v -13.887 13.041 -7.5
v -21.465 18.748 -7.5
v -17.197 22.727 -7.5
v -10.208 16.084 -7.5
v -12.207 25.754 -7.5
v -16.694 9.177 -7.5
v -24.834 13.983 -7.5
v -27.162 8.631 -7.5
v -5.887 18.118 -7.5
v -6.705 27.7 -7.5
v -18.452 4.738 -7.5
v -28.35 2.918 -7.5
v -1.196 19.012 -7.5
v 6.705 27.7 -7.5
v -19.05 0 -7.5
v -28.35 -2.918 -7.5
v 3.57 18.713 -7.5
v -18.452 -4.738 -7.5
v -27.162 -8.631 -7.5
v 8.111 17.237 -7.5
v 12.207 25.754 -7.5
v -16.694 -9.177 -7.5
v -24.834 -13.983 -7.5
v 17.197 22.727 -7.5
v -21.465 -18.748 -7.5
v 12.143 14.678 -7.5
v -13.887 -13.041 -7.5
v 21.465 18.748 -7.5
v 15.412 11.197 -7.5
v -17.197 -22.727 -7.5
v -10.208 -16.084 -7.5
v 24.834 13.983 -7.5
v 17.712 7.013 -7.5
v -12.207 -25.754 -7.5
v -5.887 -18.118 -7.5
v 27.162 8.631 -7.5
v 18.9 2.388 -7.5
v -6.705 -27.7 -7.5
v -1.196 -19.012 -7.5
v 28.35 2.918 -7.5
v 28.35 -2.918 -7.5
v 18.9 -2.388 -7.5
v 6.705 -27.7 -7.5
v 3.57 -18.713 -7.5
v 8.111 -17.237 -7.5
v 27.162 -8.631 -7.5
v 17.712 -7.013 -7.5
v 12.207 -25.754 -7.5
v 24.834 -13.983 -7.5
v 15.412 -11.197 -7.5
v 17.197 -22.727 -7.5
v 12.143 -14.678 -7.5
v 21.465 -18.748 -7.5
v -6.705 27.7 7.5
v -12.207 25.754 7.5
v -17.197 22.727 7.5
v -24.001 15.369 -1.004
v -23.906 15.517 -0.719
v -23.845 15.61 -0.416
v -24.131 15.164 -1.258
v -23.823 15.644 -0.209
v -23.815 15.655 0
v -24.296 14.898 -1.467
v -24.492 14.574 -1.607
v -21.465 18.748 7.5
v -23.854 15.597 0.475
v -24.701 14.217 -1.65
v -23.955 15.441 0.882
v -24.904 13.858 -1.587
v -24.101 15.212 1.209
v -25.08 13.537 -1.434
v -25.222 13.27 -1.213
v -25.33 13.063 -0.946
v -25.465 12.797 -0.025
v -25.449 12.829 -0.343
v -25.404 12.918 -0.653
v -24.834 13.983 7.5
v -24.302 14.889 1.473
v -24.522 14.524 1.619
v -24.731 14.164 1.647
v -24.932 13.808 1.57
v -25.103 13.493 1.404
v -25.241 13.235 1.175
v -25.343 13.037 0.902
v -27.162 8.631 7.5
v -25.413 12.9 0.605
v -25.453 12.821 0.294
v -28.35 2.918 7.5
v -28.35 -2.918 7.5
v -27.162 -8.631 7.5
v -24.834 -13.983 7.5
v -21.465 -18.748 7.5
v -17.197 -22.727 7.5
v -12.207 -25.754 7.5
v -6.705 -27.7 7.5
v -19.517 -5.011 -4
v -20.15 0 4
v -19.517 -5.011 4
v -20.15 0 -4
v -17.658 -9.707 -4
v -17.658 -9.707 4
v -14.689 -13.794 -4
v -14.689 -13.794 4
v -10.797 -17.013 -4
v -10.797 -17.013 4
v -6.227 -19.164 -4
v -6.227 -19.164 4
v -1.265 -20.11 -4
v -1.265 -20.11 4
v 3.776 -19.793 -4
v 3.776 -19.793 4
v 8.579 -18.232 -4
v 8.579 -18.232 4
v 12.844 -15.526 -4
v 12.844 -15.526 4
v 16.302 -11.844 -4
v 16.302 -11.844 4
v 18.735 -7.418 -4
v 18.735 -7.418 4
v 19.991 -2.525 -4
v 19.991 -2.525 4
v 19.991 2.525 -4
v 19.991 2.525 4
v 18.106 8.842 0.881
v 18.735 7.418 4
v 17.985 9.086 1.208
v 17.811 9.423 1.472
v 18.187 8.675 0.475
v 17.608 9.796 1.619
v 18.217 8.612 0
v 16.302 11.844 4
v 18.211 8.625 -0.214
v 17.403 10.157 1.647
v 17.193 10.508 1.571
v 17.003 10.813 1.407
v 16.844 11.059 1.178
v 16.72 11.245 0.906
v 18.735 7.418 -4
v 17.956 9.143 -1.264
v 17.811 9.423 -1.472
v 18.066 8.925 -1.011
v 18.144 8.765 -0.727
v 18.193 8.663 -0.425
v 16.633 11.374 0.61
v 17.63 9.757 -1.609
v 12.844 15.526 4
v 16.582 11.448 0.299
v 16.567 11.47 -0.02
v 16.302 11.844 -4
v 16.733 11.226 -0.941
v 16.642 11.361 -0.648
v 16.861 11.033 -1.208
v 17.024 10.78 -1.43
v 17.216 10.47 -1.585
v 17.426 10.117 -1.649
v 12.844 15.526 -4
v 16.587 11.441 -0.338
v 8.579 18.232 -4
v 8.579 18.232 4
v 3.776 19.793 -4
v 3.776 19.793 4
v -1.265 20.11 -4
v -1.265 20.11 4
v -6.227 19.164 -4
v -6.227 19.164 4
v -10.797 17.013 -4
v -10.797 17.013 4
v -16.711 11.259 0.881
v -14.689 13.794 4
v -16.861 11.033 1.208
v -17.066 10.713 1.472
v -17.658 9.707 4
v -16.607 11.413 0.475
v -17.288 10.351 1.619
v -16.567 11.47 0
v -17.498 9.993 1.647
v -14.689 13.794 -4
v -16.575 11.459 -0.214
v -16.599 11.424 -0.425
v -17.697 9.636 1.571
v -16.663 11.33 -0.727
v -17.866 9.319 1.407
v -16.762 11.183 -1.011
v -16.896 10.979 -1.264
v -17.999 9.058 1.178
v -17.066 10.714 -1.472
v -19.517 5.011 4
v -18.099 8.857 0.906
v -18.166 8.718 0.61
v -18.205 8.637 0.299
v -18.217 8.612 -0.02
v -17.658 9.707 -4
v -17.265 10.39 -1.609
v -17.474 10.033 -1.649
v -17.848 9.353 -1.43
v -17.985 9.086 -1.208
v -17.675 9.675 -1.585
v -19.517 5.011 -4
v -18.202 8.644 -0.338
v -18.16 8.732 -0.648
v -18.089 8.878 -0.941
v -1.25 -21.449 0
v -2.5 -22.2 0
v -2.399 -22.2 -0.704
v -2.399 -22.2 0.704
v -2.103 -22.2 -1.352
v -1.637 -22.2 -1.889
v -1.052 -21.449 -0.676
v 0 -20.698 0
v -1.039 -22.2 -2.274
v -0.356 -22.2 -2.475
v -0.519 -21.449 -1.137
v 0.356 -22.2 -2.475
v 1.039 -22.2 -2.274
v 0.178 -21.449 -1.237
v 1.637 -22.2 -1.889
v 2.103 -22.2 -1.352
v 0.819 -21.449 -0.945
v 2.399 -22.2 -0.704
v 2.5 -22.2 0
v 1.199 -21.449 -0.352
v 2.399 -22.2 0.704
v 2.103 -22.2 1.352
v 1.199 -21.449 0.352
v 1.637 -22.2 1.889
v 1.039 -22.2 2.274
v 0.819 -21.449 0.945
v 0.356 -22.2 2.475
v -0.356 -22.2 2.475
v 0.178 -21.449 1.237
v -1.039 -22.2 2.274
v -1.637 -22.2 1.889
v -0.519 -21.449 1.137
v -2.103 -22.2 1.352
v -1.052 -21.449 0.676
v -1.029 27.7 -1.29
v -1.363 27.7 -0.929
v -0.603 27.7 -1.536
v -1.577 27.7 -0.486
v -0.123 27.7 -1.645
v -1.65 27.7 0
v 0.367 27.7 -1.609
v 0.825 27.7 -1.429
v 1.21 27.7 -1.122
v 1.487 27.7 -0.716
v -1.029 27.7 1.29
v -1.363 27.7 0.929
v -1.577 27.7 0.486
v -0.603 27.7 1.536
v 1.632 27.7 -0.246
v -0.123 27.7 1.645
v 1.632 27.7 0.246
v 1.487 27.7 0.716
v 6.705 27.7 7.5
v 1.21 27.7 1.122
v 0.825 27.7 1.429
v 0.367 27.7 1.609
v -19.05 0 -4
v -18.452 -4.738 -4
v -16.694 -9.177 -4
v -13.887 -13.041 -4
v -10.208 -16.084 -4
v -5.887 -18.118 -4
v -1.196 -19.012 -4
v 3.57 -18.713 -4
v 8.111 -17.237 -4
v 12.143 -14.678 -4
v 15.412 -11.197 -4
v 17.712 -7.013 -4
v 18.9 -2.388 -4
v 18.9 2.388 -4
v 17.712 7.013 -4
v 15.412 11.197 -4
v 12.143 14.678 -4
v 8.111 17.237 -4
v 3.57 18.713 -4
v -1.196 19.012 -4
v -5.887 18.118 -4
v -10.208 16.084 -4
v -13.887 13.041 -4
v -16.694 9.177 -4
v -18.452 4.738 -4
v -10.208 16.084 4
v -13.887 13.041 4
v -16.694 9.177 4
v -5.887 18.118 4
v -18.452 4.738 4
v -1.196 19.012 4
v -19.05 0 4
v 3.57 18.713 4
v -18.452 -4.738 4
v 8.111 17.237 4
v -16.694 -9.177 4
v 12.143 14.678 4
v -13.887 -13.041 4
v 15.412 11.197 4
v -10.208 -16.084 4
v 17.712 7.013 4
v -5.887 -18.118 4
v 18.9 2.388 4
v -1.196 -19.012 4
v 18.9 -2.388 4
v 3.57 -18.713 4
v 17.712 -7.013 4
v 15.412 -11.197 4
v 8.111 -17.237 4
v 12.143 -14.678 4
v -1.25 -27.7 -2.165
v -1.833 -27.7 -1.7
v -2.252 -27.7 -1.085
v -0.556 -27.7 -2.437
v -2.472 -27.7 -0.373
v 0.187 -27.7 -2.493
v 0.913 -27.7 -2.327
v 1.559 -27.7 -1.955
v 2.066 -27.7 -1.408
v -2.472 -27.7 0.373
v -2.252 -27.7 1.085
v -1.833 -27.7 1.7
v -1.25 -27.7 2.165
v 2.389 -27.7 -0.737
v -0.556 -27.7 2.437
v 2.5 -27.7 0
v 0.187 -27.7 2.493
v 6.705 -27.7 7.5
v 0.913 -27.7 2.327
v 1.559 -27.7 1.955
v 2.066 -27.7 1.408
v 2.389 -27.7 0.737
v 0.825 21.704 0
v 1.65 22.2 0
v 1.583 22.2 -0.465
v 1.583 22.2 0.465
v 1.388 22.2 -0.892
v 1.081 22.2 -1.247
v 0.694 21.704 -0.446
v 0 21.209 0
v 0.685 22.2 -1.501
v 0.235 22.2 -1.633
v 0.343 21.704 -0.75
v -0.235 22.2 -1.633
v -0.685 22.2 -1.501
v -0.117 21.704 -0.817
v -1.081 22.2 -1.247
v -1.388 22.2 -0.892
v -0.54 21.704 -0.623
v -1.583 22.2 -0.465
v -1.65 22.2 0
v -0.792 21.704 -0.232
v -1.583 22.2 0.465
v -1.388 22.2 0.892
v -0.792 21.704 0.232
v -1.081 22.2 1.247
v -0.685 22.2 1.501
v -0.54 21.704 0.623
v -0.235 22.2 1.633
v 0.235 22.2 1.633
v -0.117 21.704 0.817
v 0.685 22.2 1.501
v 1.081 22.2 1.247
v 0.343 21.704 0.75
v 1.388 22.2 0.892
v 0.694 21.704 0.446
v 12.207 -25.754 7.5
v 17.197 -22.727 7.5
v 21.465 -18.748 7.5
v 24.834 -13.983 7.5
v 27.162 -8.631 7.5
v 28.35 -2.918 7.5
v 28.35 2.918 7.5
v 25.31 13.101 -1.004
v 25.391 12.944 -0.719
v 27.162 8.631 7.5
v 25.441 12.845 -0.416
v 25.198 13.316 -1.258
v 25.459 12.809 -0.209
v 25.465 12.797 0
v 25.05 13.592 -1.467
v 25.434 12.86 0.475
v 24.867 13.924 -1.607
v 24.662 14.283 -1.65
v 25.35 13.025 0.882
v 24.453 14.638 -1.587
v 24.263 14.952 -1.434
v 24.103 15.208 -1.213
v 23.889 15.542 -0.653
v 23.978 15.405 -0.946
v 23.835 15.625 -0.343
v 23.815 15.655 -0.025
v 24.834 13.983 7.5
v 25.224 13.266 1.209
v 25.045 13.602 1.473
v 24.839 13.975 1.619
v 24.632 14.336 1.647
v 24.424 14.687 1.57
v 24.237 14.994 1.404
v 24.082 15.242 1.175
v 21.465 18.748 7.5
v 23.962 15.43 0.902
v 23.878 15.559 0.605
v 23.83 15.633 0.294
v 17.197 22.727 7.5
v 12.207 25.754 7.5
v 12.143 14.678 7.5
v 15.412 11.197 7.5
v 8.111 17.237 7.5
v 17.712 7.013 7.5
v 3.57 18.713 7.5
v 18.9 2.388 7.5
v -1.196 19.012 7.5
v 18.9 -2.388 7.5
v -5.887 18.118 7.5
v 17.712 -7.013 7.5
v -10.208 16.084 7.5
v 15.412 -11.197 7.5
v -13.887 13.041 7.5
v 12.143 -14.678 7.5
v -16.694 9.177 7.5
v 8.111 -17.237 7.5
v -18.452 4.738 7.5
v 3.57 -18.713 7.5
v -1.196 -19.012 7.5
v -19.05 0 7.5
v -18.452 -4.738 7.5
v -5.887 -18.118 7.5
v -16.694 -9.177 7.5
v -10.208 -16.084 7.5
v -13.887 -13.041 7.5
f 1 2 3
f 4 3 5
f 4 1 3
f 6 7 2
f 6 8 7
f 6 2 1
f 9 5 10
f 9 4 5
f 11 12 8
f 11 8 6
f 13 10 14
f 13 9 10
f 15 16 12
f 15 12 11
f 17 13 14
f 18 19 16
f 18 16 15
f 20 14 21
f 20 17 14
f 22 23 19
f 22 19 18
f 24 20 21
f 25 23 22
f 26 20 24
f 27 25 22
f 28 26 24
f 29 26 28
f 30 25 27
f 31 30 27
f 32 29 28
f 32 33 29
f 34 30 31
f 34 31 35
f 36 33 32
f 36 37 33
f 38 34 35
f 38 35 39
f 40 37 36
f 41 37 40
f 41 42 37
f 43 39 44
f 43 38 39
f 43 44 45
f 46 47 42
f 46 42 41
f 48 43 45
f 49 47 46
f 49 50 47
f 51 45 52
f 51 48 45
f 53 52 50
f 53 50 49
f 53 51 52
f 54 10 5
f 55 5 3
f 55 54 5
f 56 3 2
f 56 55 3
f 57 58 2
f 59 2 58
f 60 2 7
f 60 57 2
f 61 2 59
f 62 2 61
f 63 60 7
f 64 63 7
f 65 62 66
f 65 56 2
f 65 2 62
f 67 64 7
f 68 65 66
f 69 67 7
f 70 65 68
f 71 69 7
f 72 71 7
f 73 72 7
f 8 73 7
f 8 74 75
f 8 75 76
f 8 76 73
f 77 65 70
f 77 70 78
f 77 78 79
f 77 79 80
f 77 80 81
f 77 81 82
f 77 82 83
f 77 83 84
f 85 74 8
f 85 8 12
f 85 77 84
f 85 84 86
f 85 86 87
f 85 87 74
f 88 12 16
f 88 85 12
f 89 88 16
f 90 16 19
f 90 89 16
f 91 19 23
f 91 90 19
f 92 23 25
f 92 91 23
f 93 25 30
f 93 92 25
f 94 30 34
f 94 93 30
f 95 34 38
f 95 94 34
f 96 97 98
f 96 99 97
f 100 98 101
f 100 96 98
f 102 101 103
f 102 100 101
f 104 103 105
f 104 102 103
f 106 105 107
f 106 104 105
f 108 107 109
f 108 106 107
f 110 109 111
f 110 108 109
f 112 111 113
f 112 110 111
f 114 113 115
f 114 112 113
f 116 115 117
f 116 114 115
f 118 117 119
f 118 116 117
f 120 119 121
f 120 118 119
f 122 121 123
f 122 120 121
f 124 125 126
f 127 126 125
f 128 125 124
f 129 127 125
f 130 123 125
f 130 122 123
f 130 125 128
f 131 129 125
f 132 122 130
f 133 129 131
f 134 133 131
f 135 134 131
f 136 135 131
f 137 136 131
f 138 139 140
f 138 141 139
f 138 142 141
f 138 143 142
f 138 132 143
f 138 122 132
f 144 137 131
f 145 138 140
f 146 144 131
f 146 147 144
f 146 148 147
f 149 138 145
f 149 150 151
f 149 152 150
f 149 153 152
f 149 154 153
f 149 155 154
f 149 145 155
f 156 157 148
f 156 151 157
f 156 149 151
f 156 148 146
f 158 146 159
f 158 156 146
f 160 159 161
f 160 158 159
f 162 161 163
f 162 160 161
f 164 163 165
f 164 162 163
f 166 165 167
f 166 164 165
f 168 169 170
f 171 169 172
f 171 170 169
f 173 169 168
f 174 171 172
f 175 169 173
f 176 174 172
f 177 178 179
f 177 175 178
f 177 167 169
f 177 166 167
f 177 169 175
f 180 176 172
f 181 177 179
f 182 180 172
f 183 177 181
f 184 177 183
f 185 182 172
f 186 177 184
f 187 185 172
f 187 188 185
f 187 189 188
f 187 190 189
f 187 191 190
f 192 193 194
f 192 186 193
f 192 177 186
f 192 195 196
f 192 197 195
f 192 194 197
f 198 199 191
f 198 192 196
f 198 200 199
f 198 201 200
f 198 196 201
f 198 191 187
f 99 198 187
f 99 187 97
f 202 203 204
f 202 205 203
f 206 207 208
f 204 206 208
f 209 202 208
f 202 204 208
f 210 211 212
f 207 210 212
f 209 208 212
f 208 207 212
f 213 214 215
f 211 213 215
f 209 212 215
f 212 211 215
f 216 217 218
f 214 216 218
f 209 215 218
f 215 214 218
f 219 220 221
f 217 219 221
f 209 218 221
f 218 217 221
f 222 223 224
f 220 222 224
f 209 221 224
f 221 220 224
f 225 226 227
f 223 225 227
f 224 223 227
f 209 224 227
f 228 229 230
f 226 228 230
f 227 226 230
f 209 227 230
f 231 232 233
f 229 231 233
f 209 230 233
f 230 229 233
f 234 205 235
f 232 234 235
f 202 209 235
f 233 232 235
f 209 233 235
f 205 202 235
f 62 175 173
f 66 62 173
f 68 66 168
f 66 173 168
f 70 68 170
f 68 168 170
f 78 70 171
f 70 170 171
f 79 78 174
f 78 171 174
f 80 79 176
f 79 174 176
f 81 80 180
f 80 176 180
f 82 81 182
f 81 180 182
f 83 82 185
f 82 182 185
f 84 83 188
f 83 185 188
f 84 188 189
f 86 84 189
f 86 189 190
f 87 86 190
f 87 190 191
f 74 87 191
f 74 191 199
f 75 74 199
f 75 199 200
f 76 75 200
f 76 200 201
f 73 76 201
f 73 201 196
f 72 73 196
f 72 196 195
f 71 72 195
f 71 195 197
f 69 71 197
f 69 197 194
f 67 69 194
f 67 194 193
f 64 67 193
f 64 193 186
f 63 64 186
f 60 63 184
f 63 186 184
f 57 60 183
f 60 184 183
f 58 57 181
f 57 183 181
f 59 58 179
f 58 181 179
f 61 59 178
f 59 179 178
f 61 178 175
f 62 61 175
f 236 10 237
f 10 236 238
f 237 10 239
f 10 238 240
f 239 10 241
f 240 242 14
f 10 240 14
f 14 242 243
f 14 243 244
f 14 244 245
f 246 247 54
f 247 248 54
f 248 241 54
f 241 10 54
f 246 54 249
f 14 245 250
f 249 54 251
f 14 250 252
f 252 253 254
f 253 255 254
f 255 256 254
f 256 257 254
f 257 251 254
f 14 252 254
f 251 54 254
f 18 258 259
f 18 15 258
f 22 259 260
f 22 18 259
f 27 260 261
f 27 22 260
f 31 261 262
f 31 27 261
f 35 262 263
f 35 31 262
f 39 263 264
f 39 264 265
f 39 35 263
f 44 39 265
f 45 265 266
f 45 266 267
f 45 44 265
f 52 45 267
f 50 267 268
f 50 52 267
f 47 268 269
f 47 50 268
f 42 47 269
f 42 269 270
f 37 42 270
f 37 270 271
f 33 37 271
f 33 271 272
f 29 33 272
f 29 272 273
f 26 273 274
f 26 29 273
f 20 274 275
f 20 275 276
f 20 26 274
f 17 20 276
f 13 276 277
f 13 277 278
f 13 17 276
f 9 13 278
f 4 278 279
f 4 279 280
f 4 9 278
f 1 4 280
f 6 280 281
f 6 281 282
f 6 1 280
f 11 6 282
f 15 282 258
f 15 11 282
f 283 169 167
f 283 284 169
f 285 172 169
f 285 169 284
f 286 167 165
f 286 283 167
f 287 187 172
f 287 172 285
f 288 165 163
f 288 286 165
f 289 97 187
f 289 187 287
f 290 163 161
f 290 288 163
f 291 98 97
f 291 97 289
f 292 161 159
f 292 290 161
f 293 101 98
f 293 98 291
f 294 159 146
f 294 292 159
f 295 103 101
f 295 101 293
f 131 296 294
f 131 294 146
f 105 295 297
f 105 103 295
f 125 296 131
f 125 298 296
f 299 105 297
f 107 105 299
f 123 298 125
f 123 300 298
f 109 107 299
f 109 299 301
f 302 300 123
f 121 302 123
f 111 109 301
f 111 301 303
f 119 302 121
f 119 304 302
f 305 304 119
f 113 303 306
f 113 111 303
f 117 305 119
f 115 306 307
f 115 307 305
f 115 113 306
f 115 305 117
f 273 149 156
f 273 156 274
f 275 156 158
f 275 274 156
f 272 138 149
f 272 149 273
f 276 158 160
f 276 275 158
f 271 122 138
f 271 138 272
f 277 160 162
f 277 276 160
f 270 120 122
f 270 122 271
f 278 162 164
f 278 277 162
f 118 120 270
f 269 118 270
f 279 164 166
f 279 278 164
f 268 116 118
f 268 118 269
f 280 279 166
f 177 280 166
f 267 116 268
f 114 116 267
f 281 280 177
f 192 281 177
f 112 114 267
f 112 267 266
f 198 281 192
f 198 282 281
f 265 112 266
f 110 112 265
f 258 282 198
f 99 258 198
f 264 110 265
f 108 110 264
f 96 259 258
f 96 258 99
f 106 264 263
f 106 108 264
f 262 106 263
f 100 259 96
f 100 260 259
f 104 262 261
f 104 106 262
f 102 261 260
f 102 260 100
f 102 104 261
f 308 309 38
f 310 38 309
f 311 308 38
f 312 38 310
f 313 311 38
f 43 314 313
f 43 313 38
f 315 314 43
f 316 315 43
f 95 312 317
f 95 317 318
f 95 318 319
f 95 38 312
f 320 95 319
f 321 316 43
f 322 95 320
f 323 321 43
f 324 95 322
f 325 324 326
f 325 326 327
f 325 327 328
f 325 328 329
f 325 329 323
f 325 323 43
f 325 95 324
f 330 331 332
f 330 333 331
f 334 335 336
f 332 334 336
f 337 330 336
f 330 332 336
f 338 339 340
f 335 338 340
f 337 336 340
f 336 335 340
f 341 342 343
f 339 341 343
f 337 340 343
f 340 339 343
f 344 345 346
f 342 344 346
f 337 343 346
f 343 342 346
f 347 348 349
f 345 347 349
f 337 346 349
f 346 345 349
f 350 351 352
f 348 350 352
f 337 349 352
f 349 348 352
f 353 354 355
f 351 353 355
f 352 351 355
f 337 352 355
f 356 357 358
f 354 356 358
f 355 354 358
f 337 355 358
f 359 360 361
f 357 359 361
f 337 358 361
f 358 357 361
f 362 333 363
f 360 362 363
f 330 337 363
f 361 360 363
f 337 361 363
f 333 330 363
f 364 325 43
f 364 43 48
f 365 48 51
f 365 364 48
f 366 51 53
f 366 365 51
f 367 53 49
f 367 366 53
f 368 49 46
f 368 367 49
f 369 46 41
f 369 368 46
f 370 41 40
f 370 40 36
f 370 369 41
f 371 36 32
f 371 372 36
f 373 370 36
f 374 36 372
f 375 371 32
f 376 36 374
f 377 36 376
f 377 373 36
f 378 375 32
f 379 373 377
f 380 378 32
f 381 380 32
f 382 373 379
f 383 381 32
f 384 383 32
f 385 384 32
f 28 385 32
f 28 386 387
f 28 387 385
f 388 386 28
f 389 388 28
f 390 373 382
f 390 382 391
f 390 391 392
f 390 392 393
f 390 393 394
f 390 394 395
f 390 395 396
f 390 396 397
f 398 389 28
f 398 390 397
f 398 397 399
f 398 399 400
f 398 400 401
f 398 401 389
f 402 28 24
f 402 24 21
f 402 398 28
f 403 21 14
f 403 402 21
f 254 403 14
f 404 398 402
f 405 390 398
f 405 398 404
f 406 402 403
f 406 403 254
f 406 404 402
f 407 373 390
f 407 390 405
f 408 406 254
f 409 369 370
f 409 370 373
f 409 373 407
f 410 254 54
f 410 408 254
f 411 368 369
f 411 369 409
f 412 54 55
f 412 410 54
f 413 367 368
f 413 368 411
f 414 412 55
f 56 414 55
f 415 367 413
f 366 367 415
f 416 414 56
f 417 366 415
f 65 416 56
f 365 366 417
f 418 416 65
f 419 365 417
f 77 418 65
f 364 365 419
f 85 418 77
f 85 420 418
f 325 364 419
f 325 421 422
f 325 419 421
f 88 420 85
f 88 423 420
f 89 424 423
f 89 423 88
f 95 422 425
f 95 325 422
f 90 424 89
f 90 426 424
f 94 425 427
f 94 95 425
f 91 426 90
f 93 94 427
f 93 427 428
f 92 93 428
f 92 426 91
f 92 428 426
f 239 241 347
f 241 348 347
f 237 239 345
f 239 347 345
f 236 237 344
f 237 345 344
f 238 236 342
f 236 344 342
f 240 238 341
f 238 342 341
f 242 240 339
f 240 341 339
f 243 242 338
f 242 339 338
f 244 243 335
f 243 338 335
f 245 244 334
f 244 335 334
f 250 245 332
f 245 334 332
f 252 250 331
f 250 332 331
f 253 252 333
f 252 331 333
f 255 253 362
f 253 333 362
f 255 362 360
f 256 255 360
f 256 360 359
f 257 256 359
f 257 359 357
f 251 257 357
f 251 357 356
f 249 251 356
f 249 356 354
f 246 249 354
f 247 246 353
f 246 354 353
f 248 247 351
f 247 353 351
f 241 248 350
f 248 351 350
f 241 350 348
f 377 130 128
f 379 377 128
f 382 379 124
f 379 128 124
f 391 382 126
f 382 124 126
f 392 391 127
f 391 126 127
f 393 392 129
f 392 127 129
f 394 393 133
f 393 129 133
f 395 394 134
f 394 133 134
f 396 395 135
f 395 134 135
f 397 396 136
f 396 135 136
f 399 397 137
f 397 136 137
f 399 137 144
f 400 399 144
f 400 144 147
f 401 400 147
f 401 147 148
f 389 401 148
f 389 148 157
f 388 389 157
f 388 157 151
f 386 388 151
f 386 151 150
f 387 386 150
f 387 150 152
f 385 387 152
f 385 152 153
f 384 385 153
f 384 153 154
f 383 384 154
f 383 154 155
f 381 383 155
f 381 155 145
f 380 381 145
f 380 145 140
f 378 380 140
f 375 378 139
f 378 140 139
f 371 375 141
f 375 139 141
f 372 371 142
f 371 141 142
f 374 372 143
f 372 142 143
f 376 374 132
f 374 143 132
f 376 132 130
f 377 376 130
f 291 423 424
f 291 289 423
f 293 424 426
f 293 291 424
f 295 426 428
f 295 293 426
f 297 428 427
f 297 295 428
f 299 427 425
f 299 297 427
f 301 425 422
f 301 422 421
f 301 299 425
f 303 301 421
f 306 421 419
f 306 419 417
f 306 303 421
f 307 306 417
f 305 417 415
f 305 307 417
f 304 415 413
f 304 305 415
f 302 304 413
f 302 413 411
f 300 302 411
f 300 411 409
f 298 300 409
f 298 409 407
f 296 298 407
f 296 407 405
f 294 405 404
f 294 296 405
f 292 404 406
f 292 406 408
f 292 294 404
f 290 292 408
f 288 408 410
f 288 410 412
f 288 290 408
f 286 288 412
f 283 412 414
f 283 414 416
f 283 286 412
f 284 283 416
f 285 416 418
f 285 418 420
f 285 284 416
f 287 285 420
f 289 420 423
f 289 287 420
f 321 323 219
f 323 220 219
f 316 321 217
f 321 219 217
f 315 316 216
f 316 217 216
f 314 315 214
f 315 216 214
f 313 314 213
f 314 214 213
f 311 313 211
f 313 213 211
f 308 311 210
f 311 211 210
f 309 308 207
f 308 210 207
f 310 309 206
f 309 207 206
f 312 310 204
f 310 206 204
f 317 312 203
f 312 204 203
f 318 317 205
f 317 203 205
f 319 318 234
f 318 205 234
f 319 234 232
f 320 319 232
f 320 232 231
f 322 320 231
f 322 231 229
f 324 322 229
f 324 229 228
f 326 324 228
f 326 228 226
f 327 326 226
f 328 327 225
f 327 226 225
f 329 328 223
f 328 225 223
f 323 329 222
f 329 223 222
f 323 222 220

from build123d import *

# Parameters (mm, degrees)
SKETCH_2_W                       = 64.02174429
SKETCH_2_H                       = 9.248919907
CUT_EXTRUDE_1_DEPTH              = 49
HOLE_WIZARD_M4_2_D               = 3.3
HOLE_WIZARD_M4_2_DEPTH           = 5.5
HOLE_WIZARD_M4_2_TIP             = 0.991420021
HOLE_WIZARD_M6_2_D               = 5
HOLE_WIZARD_M6_2_DEPTH           = 5.5
HOLE_WIZARD_M6_2_TIP             = 1.502151548
HOLE_WIZARD_M4_3_D               = 3.3
HOLE_WIZARD_M4_3_DEPTH           = 13.4
HOLE_WIZARD_M4_3_TIP             = 0.991420021
HOLE_WIZARD_M4_3_ON_FACE_2_D     = 3.3
HOLE_WIZARD_M4_3_ON_FACE_2_DEPTH = 13.4
HOLE_WIZARD_M4_3_ON_FACE_2_TIP   = 0.991420021


with BuildPart() as part:
    # 草图1 → 旋转1 (revolve)
    with BuildSketch(Plane(origin=(0, 0, 0), x_dir=(1, 0, 0), z_dir=(0, 1, 0)), mode=Mode.PRIVATE) as revolve_1_sk:
        Polygon((28.5, 7.5), (28.5, -7.5), (19.05, -7.5), (19.05, -4), (20.15, -4), (20.15, 4), (19.05, 4), (19.05, 7.5), align=None)
    revolve(revolve_1_sk.sketch.rotate(Axis((0, 0, -31.9390681), (0, 0, 1)), 180), axis=Axis((0, 0, -31.9390681), (0, 0, 1)))  # turned: the seam where the file's is

    # 草图2 → 切除-拉伸1 (cut)
    with BuildSketch(Plane.XY.offset(7.5)):
        with Locations((-1.141100508, 32.324459954)):
            Rectangle(SKETCH_2_W, SKETCH_2_H)
        with Locations((-1.141100508, -32.324459954)):
            Rectangle(SKETCH_2_W, SKETCH_2_H)
    extrude(amount=-CUT_EXTRUDE_1_DEPTH, mode=Mode.SUBTRACT)

    # M4 螺纹孔2
    with Locations(Plane(origin=(0, 27.7, 0), x_dir=(1, 0, 0), z_dir=(0, 1, 0))):
        with Locations((0, 0)):
            Hole(HOLE_WIZARD_M4_2_D / 2, depth=HOLE_WIZARD_M4_2_DEPTH)
            with Locations((0, 0, -(HOLE_WIZARD_M4_2_DEPTH + HOLE_WIZARD_M4_2_TIP / 2))):  # 118° drill point
                Cone(0, HOLE_WIZARD_M4_2_D / 2, HOLE_WIZARD_M4_2_TIP, mode=Mode.SUBTRACT)

    # M6 螺纹孔2
    with Locations(Plane(origin=(0, -27.7, 0), x_dir=(-1, 0, 0), z_dir=(0, -1, 0))):
        with Locations((0, 0)):
            Hole(HOLE_WIZARD_M6_2_D / 2, depth=HOLE_WIZARD_M6_2_DEPTH)
            with Locations((0, 0, -(HOLE_WIZARD_M6_2_DEPTH + HOLE_WIZARD_M6_2_TIP / 2))):  # 118° drill point
                Cone(0, HOLE_WIZARD_M6_2_D / 2, HOLE_WIZARD_M6_2_TIP, mode=Mode.SUBTRACT)

    # M4 螺纹孔3
    with Locations(Plane(origin=(24.681724008, 14.25, 0), x_dir=(-0.5, 0.866025404, 0), z_dir=(0.866025404, 0.5, 0))):
        with Locations((0, 0)):
            Hole(HOLE_WIZARD_M4_3_D / 2, depth=HOLE_WIZARD_M4_3_DEPTH)
            with Locations((0, 0, -(HOLE_WIZARD_M4_3_DEPTH + HOLE_WIZARD_M4_3_TIP / 2))):  # 118° drill point
                Cone(0, HOLE_WIZARD_M4_3_D / 2, HOLE_WIZARD_M4_3_TIP, mode=Mode.SUBTRACT)

    # M4 螺纹孔3 on face 2
    with Locations(Plane(origin=(-24.681724008, 14.25, 0), x_dir=(-0.500000175, -0.866025303, 0), z_dir=(-0.866025303, 0.500000175, 0))):
        with Locations((0, 0)):
            Hole(HOLE_WIZARD_M4_3_ON_FACE_2_D / 2, depth=HOLE_WIZARD_M4_3_ON_FACE_2_DEPTH)
            with Locations((0, 0, -(HOLE_WIZARD_M4_3_ON_FACE_2_DEPTH + HOLE_WIZARD_M4_3_ON_FACE_2_TIP / 2))):  # 118° drill point
                Cone(0, HOLE_WIZARD_M4_3_ON_FACE_2_D / 2, HOLE_WIZARD_M4_3_ON_FACE_2_TIP, mode=Mode.SUBTRACT)


solid = part.part
